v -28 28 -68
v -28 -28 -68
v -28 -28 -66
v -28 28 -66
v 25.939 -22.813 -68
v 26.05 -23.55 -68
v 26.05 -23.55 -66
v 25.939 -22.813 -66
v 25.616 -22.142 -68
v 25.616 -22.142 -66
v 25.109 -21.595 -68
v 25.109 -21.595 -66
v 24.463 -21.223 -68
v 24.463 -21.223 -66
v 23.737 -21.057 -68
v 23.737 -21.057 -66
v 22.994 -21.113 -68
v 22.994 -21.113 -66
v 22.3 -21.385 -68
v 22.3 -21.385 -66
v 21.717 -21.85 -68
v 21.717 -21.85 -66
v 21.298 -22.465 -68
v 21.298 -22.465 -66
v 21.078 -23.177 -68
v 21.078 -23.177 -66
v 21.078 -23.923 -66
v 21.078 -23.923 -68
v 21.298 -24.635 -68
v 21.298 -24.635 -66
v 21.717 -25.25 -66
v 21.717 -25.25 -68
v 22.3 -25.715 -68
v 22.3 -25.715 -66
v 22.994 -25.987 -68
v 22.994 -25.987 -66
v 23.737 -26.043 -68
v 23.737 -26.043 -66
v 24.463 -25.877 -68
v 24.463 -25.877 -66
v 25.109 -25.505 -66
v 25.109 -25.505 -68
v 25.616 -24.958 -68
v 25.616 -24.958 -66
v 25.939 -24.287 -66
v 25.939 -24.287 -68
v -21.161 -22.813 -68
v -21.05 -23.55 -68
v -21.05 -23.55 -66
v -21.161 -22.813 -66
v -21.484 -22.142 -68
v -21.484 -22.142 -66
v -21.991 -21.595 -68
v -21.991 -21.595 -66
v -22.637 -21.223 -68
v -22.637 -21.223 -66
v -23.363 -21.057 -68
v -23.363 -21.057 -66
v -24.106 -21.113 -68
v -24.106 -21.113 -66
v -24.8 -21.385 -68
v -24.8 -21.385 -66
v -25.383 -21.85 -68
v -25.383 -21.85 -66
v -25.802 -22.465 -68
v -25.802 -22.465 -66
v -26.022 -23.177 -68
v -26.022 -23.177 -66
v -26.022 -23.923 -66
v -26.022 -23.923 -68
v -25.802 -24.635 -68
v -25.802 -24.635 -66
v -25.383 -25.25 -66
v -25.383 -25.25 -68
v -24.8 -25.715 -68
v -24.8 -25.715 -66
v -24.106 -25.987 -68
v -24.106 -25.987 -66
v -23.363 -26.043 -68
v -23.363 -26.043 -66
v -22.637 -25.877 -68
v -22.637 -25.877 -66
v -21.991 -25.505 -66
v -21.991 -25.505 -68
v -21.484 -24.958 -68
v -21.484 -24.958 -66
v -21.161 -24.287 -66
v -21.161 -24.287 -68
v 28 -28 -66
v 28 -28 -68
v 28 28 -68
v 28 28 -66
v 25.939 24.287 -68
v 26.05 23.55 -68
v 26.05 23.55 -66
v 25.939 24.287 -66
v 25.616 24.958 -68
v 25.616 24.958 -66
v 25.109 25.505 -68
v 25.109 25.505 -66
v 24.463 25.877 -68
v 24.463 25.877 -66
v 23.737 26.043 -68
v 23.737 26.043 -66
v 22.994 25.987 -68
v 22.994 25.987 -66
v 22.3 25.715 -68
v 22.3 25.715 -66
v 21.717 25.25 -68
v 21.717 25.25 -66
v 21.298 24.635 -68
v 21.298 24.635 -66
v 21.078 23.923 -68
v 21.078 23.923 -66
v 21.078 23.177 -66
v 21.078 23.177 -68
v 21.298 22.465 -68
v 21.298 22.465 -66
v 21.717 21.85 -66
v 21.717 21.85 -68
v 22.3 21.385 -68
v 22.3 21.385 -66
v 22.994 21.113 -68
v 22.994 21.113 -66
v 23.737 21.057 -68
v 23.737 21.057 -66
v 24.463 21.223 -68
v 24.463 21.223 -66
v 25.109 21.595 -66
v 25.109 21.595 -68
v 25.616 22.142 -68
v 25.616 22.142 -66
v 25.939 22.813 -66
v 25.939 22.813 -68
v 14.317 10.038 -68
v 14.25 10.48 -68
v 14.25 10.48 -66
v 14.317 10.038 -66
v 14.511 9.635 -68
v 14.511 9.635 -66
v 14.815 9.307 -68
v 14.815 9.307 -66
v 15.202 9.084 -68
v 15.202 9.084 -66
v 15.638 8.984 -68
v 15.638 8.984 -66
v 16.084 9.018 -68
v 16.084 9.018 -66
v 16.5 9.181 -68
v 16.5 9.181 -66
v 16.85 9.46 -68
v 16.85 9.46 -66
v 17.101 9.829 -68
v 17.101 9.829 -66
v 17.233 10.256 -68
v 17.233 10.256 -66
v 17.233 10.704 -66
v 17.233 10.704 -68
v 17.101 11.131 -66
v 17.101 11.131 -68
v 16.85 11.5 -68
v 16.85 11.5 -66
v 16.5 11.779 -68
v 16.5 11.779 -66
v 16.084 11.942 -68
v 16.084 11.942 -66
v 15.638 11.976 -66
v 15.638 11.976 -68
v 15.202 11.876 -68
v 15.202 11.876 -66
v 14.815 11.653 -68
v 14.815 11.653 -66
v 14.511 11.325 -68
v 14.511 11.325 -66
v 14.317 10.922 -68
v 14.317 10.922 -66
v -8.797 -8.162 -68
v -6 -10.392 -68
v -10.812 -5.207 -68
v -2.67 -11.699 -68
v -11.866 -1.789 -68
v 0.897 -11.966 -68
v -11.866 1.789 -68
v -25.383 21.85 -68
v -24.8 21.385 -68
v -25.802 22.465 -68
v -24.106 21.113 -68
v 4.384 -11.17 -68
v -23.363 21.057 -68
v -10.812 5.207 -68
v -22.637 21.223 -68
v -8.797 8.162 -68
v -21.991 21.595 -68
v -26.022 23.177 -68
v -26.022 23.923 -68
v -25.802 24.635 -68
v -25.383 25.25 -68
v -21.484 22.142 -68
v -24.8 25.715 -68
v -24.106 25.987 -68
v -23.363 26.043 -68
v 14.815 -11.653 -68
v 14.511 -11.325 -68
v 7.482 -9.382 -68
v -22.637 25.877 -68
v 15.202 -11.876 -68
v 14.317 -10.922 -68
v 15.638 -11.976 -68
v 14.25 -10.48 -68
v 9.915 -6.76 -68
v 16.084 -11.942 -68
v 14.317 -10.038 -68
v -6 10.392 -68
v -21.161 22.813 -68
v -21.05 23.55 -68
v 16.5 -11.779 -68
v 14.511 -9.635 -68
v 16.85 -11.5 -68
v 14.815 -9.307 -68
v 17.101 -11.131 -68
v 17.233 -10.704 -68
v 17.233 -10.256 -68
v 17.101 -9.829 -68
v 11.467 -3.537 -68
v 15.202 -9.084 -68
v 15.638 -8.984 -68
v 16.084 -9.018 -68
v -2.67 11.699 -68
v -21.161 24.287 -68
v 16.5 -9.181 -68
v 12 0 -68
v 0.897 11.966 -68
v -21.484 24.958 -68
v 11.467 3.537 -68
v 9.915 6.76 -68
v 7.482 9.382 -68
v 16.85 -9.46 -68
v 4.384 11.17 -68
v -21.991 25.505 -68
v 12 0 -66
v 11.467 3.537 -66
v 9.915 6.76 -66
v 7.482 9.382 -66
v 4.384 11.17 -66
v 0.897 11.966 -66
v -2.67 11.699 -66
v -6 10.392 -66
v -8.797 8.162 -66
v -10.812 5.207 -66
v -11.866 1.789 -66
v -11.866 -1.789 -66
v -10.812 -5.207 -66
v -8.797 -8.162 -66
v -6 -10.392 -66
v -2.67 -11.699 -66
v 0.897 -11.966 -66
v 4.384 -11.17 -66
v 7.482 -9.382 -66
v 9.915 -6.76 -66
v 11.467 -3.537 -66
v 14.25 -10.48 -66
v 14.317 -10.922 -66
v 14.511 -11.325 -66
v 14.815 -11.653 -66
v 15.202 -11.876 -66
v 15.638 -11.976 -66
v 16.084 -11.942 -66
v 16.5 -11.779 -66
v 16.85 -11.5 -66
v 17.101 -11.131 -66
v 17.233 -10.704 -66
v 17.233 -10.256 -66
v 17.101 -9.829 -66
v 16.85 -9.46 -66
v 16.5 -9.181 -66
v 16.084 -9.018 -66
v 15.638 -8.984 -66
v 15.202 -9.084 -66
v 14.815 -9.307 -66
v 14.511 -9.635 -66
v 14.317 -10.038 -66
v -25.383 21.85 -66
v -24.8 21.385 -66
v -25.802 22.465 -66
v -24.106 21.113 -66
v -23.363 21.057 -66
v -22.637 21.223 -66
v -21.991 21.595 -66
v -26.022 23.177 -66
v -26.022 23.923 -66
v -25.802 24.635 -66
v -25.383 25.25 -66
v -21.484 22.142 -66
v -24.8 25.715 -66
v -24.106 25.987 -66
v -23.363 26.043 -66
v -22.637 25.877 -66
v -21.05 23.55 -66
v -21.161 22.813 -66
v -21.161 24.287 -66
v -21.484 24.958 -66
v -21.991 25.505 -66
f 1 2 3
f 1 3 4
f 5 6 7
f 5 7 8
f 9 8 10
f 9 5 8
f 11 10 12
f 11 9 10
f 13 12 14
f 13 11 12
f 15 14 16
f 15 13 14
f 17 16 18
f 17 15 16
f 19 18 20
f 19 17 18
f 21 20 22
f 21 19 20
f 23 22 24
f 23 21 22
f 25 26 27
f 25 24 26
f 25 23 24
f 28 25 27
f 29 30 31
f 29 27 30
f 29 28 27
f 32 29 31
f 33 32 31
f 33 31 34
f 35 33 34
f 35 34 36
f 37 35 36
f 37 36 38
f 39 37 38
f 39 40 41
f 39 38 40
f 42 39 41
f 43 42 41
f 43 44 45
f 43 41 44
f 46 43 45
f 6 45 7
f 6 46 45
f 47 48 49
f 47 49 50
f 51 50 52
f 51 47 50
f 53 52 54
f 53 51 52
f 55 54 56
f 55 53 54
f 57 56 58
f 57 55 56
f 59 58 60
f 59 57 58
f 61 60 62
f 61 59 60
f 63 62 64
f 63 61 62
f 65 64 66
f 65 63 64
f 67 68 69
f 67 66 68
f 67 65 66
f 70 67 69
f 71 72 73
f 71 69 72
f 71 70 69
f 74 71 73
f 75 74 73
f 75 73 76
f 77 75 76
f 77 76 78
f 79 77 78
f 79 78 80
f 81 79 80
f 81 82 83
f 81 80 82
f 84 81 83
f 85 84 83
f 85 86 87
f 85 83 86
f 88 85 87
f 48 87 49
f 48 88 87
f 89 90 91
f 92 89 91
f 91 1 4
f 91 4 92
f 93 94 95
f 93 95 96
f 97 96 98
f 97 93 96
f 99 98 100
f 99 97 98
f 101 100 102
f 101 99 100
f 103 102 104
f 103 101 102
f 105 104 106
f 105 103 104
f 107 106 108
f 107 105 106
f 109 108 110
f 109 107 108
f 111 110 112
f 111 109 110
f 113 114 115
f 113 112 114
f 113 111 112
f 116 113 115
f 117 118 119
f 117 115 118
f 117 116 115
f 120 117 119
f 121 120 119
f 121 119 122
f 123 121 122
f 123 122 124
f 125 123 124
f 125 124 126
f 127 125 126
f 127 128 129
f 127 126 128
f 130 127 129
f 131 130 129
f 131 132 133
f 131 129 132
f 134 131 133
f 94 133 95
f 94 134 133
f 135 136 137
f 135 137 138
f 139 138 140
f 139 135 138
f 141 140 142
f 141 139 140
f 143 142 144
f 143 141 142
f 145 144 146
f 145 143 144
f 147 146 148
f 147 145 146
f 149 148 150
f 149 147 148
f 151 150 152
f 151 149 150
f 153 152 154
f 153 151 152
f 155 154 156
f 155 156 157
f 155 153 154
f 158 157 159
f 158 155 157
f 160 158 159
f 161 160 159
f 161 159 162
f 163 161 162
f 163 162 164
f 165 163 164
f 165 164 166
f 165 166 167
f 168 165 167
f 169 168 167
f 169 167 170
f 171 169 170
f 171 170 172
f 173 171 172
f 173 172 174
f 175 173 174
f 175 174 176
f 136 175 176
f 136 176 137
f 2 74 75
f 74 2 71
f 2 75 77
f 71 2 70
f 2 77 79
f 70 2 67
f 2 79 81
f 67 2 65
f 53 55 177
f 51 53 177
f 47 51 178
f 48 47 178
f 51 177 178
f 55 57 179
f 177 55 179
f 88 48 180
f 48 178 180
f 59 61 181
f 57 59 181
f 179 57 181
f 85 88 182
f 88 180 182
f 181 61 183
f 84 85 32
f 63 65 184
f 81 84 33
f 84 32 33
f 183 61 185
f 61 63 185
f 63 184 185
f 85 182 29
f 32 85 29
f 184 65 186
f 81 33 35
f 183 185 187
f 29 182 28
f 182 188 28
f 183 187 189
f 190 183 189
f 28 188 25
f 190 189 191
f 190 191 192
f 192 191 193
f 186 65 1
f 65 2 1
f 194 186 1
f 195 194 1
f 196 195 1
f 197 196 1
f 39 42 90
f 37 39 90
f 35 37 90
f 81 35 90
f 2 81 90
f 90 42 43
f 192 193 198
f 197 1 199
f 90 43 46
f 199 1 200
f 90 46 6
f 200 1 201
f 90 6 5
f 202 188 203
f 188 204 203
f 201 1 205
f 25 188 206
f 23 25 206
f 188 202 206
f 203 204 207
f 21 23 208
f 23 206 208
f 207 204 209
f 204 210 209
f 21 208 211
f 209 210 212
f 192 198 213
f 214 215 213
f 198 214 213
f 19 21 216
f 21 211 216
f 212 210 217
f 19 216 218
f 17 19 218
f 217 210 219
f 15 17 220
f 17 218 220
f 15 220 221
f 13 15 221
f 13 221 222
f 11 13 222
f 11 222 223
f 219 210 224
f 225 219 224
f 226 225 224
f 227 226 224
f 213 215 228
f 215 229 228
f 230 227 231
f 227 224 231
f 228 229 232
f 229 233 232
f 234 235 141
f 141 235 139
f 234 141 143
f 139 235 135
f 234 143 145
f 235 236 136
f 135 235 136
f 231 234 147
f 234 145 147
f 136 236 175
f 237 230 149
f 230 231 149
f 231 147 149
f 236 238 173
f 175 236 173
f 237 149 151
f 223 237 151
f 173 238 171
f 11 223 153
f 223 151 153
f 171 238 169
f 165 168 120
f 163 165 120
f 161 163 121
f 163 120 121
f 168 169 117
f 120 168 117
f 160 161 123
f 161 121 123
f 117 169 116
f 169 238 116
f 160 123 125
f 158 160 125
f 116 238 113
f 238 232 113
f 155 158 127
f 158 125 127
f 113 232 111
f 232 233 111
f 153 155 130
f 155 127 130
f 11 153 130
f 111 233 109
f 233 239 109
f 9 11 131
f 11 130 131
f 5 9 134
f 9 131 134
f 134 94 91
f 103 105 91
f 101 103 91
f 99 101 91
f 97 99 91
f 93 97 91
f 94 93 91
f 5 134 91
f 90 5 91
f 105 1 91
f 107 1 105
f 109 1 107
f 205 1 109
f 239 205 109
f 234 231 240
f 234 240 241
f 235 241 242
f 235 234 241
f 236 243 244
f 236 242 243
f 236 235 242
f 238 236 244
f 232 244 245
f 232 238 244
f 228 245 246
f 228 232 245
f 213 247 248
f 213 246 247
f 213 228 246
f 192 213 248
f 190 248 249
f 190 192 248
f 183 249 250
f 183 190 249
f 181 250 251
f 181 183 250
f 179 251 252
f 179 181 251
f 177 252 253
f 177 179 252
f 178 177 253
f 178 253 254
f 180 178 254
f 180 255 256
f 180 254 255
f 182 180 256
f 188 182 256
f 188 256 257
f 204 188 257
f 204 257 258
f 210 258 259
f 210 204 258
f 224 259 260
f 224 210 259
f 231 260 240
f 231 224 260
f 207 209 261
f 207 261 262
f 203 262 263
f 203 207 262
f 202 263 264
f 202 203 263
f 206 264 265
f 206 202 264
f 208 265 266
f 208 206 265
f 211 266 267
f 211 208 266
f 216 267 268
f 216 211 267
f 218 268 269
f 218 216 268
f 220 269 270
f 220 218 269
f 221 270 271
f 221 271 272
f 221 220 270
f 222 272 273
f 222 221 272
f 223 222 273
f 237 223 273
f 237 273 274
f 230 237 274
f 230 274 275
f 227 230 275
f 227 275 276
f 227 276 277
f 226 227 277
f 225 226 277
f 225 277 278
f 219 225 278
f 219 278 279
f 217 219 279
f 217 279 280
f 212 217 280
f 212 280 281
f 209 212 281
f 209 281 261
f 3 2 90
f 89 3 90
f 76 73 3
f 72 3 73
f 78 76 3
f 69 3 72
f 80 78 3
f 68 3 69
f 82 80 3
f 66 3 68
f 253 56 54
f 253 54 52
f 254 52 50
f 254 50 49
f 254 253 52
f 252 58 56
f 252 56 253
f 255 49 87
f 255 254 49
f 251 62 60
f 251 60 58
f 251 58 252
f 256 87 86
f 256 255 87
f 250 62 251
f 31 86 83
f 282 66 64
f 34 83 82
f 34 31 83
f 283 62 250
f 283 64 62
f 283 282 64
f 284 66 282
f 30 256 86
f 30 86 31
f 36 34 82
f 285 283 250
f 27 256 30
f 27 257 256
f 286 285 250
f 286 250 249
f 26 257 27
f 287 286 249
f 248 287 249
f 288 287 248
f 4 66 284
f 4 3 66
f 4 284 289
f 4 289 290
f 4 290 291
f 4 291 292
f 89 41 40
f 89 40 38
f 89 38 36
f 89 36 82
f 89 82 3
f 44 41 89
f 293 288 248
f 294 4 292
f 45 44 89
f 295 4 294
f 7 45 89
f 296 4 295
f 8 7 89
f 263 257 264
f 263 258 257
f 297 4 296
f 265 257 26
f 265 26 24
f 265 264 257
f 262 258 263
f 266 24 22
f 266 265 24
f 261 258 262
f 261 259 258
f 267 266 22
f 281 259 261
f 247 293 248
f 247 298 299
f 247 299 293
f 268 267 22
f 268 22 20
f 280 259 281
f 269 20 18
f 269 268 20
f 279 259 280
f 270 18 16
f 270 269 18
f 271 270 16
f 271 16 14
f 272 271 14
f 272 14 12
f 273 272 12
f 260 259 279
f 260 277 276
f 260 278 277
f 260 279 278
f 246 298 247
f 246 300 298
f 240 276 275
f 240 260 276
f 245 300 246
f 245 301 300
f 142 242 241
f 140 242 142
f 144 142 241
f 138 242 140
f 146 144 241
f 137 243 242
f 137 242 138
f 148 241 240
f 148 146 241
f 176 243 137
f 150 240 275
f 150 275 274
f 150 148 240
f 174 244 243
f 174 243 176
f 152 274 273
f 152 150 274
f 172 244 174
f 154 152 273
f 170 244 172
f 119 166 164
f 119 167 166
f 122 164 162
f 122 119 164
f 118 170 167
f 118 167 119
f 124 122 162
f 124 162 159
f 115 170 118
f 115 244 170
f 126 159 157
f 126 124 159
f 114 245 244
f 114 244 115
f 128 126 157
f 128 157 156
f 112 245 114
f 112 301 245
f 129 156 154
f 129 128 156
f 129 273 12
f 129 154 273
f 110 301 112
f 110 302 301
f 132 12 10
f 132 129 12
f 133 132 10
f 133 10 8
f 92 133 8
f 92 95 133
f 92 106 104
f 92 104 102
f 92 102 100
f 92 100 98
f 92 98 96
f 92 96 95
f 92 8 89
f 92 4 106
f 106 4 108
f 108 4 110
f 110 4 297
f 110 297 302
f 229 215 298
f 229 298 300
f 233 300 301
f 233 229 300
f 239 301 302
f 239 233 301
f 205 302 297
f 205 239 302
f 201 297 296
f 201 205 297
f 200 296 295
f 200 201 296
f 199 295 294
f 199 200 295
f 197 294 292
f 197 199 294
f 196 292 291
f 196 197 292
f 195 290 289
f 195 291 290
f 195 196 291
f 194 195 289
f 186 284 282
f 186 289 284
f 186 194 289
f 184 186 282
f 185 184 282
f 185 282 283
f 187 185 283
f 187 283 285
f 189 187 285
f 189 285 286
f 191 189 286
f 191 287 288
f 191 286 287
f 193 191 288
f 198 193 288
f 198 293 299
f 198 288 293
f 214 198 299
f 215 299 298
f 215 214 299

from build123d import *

# Parameters (mm, degrees)
BOX274_W                    = 56
BOX274_H                    = 56
BOX274_DEPTH                = 2
CYLINDER704_R               = 1.5
CYLINDER704_DEPTH           = 20
CYLINDER705_R               = 1.5
CYLINDER705_DEPTH           = 20
COMPOUND417_PLACEMENT_ANGLE = 90
BOX272_W                    = 20
BOX272_H                    = 8
BOX272_DEPTH                = 3
BOX271_W                    = 20
BOX271_H                    = 8
BOX271_DEPTH                = 3
BOX273_W                    = 20
BOX273_H                    = 8
BOX273_DEPTH                = 3
BOX269_W                    = 20
BOX269_H                    = 8
BOX269_DEPTH                = 3
CYLINDER697_R               = 12
CYLINDER697_DEPTH           = 20
CYLINDER702_R               = 5
CYLINDER702_DEPTH           = 4
CYLINDER689_R               = 5
CYLINDER689_DEPTH           = 4
CYLINDER693_R               = 5
CYLINDER693_DEPTH           = 4
CYLINDER698_R               = 5
CYLINDER698_DEPTH           = 4
CYLINDER699_R               = 2.5
CYLINDER699_DEPTH           = 20
CYLINDER690_R               = 2.5
CYLINDER690_DEPTH           = 20
CYLINDER694_R               = 2.5
CYLINDER694_DEPTH           = 20
CYLINDER700_R               = 2.5
CYLINDER700_DEPTH           = 20
CYLINDER696_R               = 3
CYLINDER696_DEPTH           = 5
CYLINDER696_PLACEMENT_ANGLE = 22.5
CYLINDER688_R               = 3
CYLINDER688_DEPTH           = 5
CYLINDER688_PLACEMENT_ANGLE = 67.5
CYLINDER691_R               = 3
CYLINDER691_DEPTH           = 5
CYLINDER691_PLACEMENT_ANGLE = 202.5
CYLINDER692_R               = 3
CYLINDER692_DEPTH           = 5
CYLINDER692_PLACEMENT_ANGLE = 112.5
COMPOUND416_PLACEMENT_ANGLE = 45
CYLINDER703_R               = 1.5
CYLINDER703_DEPTH           = 30
CYLINDER703_PLACEMENT_ANGLE = 22.5
CYLINDER695_R               = 1.5
CYLINDER695_DEPTH           = 30
CYLINDER695_PLACEMENT_ANGLE = 67.5
CYLINDER706_R               = 1.5
CYLINDER706_DEPTH           = 30
CYLINDER706_PLACEMENT_ANGLE = 202.5
CYLINDER701_R               = 1.5
CYLINDER701_DEPTH           = 30
CYLINDER701_PLACEMENT_ANGLE = 112.5
COMPOUND412_PLACEMENT_ANGLE = 45
BOX270_W                    = 68
BOX270_H                    = 64
BOX270_DEPTH                = 8


with BuildPart() as krychle274:
    # Box274 → Box274 (new body)
    with BuildSketch(Plane(origin=(-28, -28, -68), x_dir=(1, 0, 0), z_dir=(0, 0, 1))):
        with Locations((28, 28)):
            Rectangle(BOX274_W, BOX274_H)
    extrude(amount=BOX274_DEPTH)


with BuildPart() as v_lec704:
    # Cylinder704 → Cylinder704 (new body)
    with BuildSketch(Plane(origin=(15.75, 114, 59.48), x_dir=(-1, 0, 0), z_dir=(0, 1, 0))):
        Circle(CYLINDER704_R)
    extrude(amount=CYLINDER704_DEPTH)


with BuildPart() as compound417:
    # Cylinder705 → Cylinder705 (new body)
    with BuildSketch(Plane(origin=(15.75, 114, 38.52), x_dir=(-1, 0, 0), z_dir=(0, 1, 0))):
        Circle(CYLINDER705_R)
    extrude(amount=CYLINDER705_DEPTH)

    # Compound417: union Válec704
    add(v_lec704.part)


with BuildPart() as compound417_1:
    # Compound417 placement: moved
    add(compound417.part.moved(Location((0, 49, -200))).rotate(Axis((0, 49, -200), (1, 0, 0)), COMPOUND417_PLACEMENT_ANGLE))


with BuildPart() as krychle272:
    # Box272 → Box272 (new body)
    with BuildSketch(Plane(origin=(17.55, -27.55, 31), x_dir=(1, 0, 0), z_dir=(0, 0, 1))):
        with Locations((10, 4)):
            Rectangle(BOX272_W, BOX272_H)
    extrude(amount=BOX272_DEPTH)


with BuildPart() as krychle271:
    # Box271 → Box271 (new body)
    with BuildSketch(Plane(origin=(-37.45, 19.55, 31), x_dir=(1, 0, 0), z_dir=(0, 0, 1))):
        with Locations((10, 4)):
            Rectangle(BOX271_W, BOX271_H)
    extrude(amount=BOX271_DEPTH)


with BuildPart() as krychle273:
    # Box273 → Box273 (new body)
    with BuildSketch(Plane(origin=(-37.45, -27.55, 31), x_dir=(1, 0, 0), z_dir=(0, 0, 1))):
        with Locations((10, 4)):
            Rectangle(BOX273_W, BOX273_H)
    extrude(amount=BOX273_DEPTH)


with BuildPart() as compound413:
    # Box269 → Box269 (new body)
    with BuildSketch(Plane(origin=(17.55, 19.55, 31), x_dir=(1, 0, 0), z_dir=(0, 0, 1))):
        with Locations((10, 4)):
            Rectangle(BOX269_W, BOX269_H)
    extrude(amount=BOX269_DEPTH)

    # Compound413: union Krychle272, Krychle271, Krychle273
    add(krychle272.part)
    add(krychle271.part)
    add(krychle273.part)


with BuildPart() as compound413_1:
    # Compound413 placement: moved
    add(compound413.part.moved(Location((0, 0, -4))))


with BuildPart() as v_lec697:
    # Cylinder697 → Cylinder697 (new body)
    with BuildSketch(Plane.XY.offset(15)):
        Circle(CYLINDER697_R)
    extrude(amount=CYLINDER697_DEPTH)


with BuildPart() as v_lec702:
    # Cylinder702 → Cylinder702 (new body)
    with BuildSketch(Plane(origin=(23.55, 23.55, 26), x_dir=(1, 0, 0), z_dir=(0, 0, 1))):
        Circle(CYLINDER702_R)
    extrude(amount=CYLINDER702_DEPTH)


with BuildPart() as v_lec689:
    # Cylinder689 → Cylinder689 (new body)
    with BuildSketch(Plane(origin=(23.55, -23.55, 26), x_dir=(1, 0, 0), z_dir=(0, 0, 1))):
        Circle(CYLINDER689_R)
    extrude(amount=CYLINDER689_DEPTH)


with BuildPart() as v_lec693:
    # Cylinder693 → Cylinder693 (new body)
    with BuildSketch(Plane(origin=(-23.55, 23.55, 26), x_dir=(1, 0, 0), z_dir=(0, 0, 1))):
        Circle(CYLINDER693_R)
    extrude(amount=CYLINDER693_DEPTH)


with BuildPart() as compound415:
    # Cylinder698 → Cylinder698 (new body)
    with BuildSketch(Plane(origin=(-23.55, -23.55, 26), x_dir=(1, 0, 0), z_dir=(0, 0, 1))):
        Circle(CYLINDER698_R)
    extrude(amount=CYLINDER698_DEPTH)

    # Compound415: union Válec702, Válec689, Válec693
    add(v_lec702.part)
    add(v_lec689.part)
    add(v_lec693.part)


with BuildPart() as compound415_1:
    # Compound415 placement: moved
    add(compound415.part.moved(Location((0, 0, -50))))


with BuildPart() as v_lec699:
    # Cylinder699 → Cylinder699 (new body)
    with BuildSketch(Plane(origin=(-23.55, 23.55, 20), x_dir=(1, 0, 0), z_dir=(0, 0, 1))):
        Circle(CYLINDER699_R)
    extrude(amount=CYLINDER699_DEPTH)


with BuildPart() as v_lec690:
    # Cylinder690 → Cylinder690 (new body)
    with BuildSketch(Plane(origin=(-23.55, -23.55, 20), x_dir=(1, 0, 0), z_dir=(0, 0, 1))):
        Circle(CYLINDER690_R)
    extrude(amount=CYLINDER690_DEPTH)


with BuildPart() as v_lec694:
    # Cylinder694 → Cylinder694 (new body)
    with BuildSketch(Plane(origin=(23.55, -23.55, 20), x_dir=(1, 0, 0), z_dir=(0, 0, 1))):
        Circle(CYLINDER694_R)
    extrude(amount=CYLINDER694_DEPTH)


with BuildPart() as compound414:
    # Cylinder700 → Cylinder700 (new body)
    with BuildSketch(Plane(origin=(23.55, 23.55, 20), x_dir=(1, 0, 0), z_dir=(0, 0, 1))):
        Circle(CYLINDER700_R)
    extrude(amount=CYLINDER700_DEPTH)

    # Compound414: union Válec699, Válec690, Válec694
    add(v_lec699.part)
    add(v_lec690.part)
    add(v_lec694.part)


with BuildPart() as v_lec696:
    # Cylinder696 → Cylinder696 (new body)
    with BuildSketch(Plane.XY):
        Circle(CYLINDER696_R)
    extrude(amount=CYLINDER696_DEPTH)


with BuildPart() as v_lec696_1:
    # Cylinder696 placement: moved
    add(v_lec696.part.moved(Location((-16, 0, 2))).rotate(Axis((-16, 0, 2), (0, 0, 1)), CYLINDER696_PLACEMENT_ANGLE))


with BuildPart() as v_lec688:
    # Cylinder688 → Cylinder688 (new body)
    with BuildSketch(Plane.XY):
        Circle(CYLINDER688_R)
    extrude(amount=CYLINDER688_DEPTH)


with BuildPart() as v_lec688_1:
    # Cylinder688 placement: moved
    add(v_lec688.part.moved(Location((0, 16, 2))).rotate(Axis((0, 16, 2), (0, 0, -1)), CYLINDER688_PLACEMENT_ANGLE))


with BuildPart() as v_lec691:
    # Cylinder691 → Cylinder691 (new body)
    with BuildSketch(Plane.XY):
        Circle(CYLINDER691_R)
    extrude(amount=CYLINDER691_DEPTH)


with BuildPart() as v_lec691_1:
    # Cylinder691 placement: moved
    add(v_lec691.part.moved(Location((16, 0, 2))).rotate(Axis((16, 0, 2), (0, 0, 1)), CYLINDER691_PLACEMENT_ANGLE))


with BuildPart() as compound416:
    # Cylinder692 → Cylinder692 (new body)
    with BuildSketch(Plane.XY):
        Circle(CYLINDER692_R)
    extrude(amount=CYLINDER692_DEPTH)


with BuildPart() as compound416_1:
    # Cylinder692 placement: moved
    add(compound416.part.moved(Location((0, -16, 2))).rotate(Axis((0, -16, 2), (0, 0, 1)), CYLINDER692_PLACEMENT_ANGLE))

    # Compound416: union Válec696, Válec688, Válec691
    add(v_lec696_1.part)
    add(v_lec688_1.part)
    add(v_lec691_1.part)


with BuildPart() as compound416_2:
    # Compound416 placement: moved
    add(compound416_1.part.moved(Location((0, 0, 18))).rotate(Axis((0, 0, 18), (0, 0, 1)), COMPOUND416_PLACEMENT_ANGLE))


with BuildPart() as v_lec703:
    # Cylinder703 → Cylinder703 (new body)
    with BuildSketch(Plane.XY):
        Circle(CYLINDER703_R)
    extrude(amount=CYLINDER703_DEPTH)


with BuildPart() as v_lec703_1:
    # Cylinder703 placement: moved
    add(v_lec703.part.moved(Location((-16, 0, 2))).rotate(Axis((-16, 0, 2), (0, 0, 1)), CYLINDER703_PLACEMENT_ANGLE))


with BuildPart() as v_lec695:
    # Cylinder695 → Cylinder695 (new body)
    with BuildSketch(Plane.XY):
        Circle(CYLINDER695_R)
    extrude(amount=CYLINDER695_DEPTH)


with BuildPart() as v_lec695_1:
    # Cylinder695 placement: moved
    add(v_lec695.part.moved(Location((0, 16, 2))).rotate(Axis((0, 16, 2), (0, 0, -1)), CYLINDER695_PLACEMENT_ANGLE))


with BuildPart() as v_lec706:
    # Cylinder706 → Cylinder706 (new body)
    with BuildSketch(Plane.XY):
        Circle(CYLINDER706_R)
    extrude(amount=CYLINDER706_DEPTH)


with BuildPart() as v_lec706_1:
    # Cylinder706 placement: moved
    add(v_lec706.part.moved(Location((16, 0, 2))).rotate(Axis((16, 0, 2), (0, 0, 1)), CYLINDER706_PLACEMENT_ANGLE))


with BuildPart() as compound412:
    # Cylinder701 → Cylinder701 (new body)
    with BuildSketch(Plane.XY):
        Circle(CYLINDER701_R)
    extrude(amount=CYLINDER701_DEPTH)


with BuildPart() as compound412_1:
    # Cylinder701 placement: moved
    add(compound412.part.moved(Location((0, -16, 2))).rotate(Axis((0, -16, 2), (0, 0, 1)), CYLINDER701_PLACEMENT_ANGLE))

    # Compound412: union Válec703, Válec695, Válec706
    add(v_lec703_1.part)
    add(v_lec695_1.part)
    add(v_lec706_1.part)


with BuildPart() as compound412_2:
    # Compound412 placement: moved
    add(compound412_1.part.moved(Location((0, 0, 50))).rotate(Axis((0, 0, 50), (0, 0, 1)), COMPOUND412_PLACEMENT_ANGLE))


with BuildPart() as common002:
    # Box270 → Box270 (new body)
    with BuildSketch(Plane(origin=(-34, -32, 26), x_dir=(1, 0, 0), z_dir=(0, 0, 1))):
        with Locations((34, 32)):
            Rectangle(BOX270_W, BOX270_H)
    extrude(amount=BOX270_DEPTH)

    # Cut275: cut Compound412
    add(compound412_2.part, mode=Mode.SUBTRACT)

    # Cut274: cut Compound416
    add(compound416_2.part, mode=Mode.SUBTRACT)

    # Cut273: cut Compound414
    add(compound414.part, mode=Mode.SUBTRACT)

    # Cut278: cut Compound415
    add(compound415_1.part, mode=Mode.SUBTRACT)

    # Cut277: cut Válec697
    add(v_lec697.part, mode=Mode.SUBTRACT)

    # Cut276: cut Compound413
    add(compound413_1.part, mode=Mode.SUBTRACT)


with BuildPart() as common002_1:
    # Cut276 placement: moved
    add(common002.part.moved(Location((0, 0, -100))))

    # Cut279: cut Compound417
    add(compound417_1.part, mode=Mode.SUBTRACT)

    # Common002: intersect Krychle274
    add(krychle274.part, mode=Mode.INTERSECT)


solid = common002_1.part
